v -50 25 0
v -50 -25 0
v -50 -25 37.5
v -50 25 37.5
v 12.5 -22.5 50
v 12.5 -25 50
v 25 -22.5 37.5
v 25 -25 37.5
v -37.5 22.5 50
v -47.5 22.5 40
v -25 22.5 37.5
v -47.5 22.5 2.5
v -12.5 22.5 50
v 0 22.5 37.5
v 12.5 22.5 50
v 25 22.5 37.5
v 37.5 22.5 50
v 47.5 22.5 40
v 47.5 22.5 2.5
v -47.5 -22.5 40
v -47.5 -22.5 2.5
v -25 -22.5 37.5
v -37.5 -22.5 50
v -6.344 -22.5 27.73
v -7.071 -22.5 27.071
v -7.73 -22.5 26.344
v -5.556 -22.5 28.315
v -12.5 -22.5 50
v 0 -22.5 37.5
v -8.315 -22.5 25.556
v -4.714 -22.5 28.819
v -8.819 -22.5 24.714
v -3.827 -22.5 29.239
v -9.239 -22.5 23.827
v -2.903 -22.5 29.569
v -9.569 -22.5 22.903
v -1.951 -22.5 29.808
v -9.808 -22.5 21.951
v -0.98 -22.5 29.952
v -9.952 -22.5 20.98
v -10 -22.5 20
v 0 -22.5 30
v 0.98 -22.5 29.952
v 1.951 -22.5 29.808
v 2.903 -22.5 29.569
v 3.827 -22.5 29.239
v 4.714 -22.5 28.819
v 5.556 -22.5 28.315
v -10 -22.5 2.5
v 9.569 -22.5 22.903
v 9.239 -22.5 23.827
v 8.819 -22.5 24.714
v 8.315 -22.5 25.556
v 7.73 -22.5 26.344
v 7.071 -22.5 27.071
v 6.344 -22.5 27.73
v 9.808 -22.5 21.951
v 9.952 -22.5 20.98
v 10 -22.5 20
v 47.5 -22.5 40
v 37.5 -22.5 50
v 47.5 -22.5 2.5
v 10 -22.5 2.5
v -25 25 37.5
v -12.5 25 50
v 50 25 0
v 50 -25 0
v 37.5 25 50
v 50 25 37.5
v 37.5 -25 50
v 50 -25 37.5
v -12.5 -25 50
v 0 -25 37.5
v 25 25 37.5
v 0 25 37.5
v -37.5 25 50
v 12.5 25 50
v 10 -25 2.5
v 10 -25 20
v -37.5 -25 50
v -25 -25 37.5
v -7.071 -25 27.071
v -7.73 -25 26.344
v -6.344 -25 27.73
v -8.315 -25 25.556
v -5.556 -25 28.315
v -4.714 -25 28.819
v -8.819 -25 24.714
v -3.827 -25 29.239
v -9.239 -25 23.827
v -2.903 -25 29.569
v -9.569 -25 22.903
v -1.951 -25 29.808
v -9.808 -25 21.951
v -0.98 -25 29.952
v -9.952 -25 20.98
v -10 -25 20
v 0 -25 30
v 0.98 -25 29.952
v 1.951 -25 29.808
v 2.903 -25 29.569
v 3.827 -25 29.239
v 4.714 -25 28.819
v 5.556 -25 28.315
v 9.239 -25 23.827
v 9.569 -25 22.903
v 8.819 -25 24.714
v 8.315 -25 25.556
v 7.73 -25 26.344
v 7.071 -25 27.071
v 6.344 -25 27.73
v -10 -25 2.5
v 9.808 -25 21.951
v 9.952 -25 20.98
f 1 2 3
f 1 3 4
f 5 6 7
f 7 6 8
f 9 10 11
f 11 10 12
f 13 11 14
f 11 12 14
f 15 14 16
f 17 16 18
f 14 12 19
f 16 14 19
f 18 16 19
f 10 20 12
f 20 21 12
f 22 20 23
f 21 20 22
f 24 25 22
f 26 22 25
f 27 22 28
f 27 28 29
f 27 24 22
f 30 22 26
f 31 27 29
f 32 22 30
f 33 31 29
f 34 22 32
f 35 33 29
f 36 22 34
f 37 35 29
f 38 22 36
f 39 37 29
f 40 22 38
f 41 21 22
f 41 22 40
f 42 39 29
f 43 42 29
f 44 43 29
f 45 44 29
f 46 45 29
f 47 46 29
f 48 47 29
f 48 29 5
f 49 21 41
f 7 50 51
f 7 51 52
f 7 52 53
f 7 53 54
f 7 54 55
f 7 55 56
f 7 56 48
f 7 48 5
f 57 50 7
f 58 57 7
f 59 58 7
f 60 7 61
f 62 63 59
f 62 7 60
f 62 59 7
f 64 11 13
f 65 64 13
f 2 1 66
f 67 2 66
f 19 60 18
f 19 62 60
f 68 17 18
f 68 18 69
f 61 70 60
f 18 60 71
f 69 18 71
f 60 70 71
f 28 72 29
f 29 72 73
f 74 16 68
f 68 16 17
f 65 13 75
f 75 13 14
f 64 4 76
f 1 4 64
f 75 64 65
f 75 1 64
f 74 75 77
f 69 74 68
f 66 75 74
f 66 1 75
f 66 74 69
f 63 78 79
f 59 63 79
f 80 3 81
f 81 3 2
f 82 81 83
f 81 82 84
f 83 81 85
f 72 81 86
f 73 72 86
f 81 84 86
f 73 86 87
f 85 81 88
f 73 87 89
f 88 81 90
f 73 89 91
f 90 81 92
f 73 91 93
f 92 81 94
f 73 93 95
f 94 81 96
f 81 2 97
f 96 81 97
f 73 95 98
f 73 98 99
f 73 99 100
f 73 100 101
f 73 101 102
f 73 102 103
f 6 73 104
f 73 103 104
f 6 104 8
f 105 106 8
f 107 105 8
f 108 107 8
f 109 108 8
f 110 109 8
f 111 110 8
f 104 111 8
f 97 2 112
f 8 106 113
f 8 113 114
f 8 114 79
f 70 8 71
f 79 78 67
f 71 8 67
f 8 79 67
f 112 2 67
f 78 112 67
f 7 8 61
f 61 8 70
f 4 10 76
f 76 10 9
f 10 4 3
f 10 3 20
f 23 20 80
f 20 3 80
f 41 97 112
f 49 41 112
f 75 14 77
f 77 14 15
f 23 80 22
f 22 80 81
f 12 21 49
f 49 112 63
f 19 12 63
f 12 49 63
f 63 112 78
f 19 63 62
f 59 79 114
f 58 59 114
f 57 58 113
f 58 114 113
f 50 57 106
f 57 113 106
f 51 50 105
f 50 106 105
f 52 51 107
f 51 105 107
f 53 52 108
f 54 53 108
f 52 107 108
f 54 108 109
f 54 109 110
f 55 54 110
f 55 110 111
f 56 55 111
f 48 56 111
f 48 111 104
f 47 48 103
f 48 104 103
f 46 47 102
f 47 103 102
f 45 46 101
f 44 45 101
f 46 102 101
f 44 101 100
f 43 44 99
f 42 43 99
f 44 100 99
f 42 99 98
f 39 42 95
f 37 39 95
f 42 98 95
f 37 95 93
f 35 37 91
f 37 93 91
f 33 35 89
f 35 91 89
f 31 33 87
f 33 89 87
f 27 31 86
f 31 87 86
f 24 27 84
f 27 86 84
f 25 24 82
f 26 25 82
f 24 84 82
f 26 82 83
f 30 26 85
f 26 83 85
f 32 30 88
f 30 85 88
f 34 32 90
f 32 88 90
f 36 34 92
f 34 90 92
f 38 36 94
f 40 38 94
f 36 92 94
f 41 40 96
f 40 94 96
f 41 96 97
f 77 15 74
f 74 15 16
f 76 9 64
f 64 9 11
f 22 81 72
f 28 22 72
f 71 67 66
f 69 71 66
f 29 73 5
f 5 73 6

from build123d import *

# Parameters (mm, degrees)
F0_W     = 100
F0_H     = 50
F1_DEPTH = 50
F3_DEPTH = 50
F4_T     = -2.5
F6_DEPTH = 2.5


with BuildPart() as f1:
    # F0 (on Top) → F1 (new body)
    with BuildSketch(Plane.XY):
        Rectangle(F0_W, F0_H)
    extrude(amount=F1_DEPTH)

    # F2 (on face) → F3 (cut, through all)
    with BuildSketch(Plane.XZ.offset(25)):
        Polygon((-50, 50), (-50, 37.5), (-37.5, 50), align=None)
        Polygon((-12.5, 50), (-37.5, 50), (-25, 37.5), align=None)
        Polygon((12.5, 50), (-12.5, 50), (0, 37.5), align=None)
        Polygon((37.5, 50), (12.5, 50), (25, 37.5), align=None)
        Polygon((37.5, 50), (50, 37.5), (50, 50), align=None)
    extrude(amount=-F3_DEPTH, mode=Mode.SUBTRACT)

    # F4
    f4_openings = [f1.faces().sort_by_distance(p)[0] for p in [
        (-31.25, 0, 43.75),
        (-6.25, 0, 43.75),
        (18.75, 0, 43.75),
        (43.75, 0, 43.75),
        (31.25, 0, 43.75),
        (6.25, 0, 43.75),
        (-18.75, 0, 43.75),
        (-43.75, 0, 43.75),
    ]]
    offset(amount=F4_T, openings=f4_openings)

    # F5 (on face) → F6 (cut, through all)
    with BuildSketch(Plane.XZ.offset(25)):
        with BuildLine():
            ThreePointArc((-10, 20), (0, 10), (10, 20))
            Line((10, 20), (-10, 20))
        make_face()
        with BuildLine():
            Line((-10, 20), (10, 20))
            ThreePointArc((10, 20), (0, 30), (-10, 20))
        make_face()
        with BuildLine():
            Line((10, 2.5), (10, 20))
            ThreePointArc((10, 20), (0, 10), (-10, 20))
            Line((-10, 20), (-10, 2.5))
            Line((-10, 2.5), (10, 2.5))
        make_face()
    extrude(amount=-F6_DEPTH, mode=Mode.SUBTRACT)


solid = f1.part
